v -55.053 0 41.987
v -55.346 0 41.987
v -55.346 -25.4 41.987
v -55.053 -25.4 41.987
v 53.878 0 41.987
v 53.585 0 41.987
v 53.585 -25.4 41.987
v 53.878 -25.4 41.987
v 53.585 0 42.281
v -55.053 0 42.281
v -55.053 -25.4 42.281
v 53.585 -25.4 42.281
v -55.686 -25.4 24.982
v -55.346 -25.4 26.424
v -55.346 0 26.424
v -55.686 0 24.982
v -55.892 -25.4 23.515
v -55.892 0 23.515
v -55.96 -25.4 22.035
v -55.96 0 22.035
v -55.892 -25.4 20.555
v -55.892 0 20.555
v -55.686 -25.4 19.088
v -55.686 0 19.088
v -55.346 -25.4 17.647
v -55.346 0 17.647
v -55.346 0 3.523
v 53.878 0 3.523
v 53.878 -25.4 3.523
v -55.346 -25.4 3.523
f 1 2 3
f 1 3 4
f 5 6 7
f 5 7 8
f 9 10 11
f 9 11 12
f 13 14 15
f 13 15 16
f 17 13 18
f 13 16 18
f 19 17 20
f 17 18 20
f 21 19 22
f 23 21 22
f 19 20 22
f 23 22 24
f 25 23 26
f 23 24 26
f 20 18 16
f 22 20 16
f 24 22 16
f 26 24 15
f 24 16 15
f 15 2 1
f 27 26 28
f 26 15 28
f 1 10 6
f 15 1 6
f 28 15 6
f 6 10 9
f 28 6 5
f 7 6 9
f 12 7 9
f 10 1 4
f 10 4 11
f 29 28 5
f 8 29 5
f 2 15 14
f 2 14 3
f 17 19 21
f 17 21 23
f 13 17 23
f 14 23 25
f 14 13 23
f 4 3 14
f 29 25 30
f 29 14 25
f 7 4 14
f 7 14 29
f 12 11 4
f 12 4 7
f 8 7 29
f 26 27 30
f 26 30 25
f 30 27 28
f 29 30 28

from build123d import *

# Parameters (mm, degrees)
F0_W     = 109.224658
F0_H     = 38.463522
F1_DEPTH = 25.4
F2_W     = 108.63743
F2_H     = 38.757138
F3_DEPTH = 25.4
F5_DEPTH = 25.4


with BuildPart() as f1:
    # F0 (on Front) → F1 (new body)
    with BuildSketch(Plane.XZ):
        with Locations((-0.734037, 22.755137)):
            Rectangle(F0_W, F0_H)
    extrude(amount=F1_DEPTH)

    # F2 (on Front) → F3 (join)
    with BuildSketch(Plane.XZ):
        with Locations((-0.734039, 22.901945)):
            Rectangle(F2_W, F2_H)
    extrude(amount=F3_DEPTH)

    # F4 (on Front) → F5 (join)
    with BuildSketch(Plane.XZ):
        with BuildLine():
            ThreePointArc((-51.677901, 32.926388), (-55.960342, 22.03506), (-51.677901, 11.143731))
            Line((-51.677901, 11.143731), (-51.677901, 32.926388))
        make_face()
        with BuildLine():
            Line((-29.331109, 33.973895), (-29.331109, 10.096224))
            ThreePointArc((-29.331109, 10.096224), (-23.978503, 22.03506), (-29.331109, 33.973895))
        make_face()
    extrude(amount=F5_DEPTH)


solid = f1.part
